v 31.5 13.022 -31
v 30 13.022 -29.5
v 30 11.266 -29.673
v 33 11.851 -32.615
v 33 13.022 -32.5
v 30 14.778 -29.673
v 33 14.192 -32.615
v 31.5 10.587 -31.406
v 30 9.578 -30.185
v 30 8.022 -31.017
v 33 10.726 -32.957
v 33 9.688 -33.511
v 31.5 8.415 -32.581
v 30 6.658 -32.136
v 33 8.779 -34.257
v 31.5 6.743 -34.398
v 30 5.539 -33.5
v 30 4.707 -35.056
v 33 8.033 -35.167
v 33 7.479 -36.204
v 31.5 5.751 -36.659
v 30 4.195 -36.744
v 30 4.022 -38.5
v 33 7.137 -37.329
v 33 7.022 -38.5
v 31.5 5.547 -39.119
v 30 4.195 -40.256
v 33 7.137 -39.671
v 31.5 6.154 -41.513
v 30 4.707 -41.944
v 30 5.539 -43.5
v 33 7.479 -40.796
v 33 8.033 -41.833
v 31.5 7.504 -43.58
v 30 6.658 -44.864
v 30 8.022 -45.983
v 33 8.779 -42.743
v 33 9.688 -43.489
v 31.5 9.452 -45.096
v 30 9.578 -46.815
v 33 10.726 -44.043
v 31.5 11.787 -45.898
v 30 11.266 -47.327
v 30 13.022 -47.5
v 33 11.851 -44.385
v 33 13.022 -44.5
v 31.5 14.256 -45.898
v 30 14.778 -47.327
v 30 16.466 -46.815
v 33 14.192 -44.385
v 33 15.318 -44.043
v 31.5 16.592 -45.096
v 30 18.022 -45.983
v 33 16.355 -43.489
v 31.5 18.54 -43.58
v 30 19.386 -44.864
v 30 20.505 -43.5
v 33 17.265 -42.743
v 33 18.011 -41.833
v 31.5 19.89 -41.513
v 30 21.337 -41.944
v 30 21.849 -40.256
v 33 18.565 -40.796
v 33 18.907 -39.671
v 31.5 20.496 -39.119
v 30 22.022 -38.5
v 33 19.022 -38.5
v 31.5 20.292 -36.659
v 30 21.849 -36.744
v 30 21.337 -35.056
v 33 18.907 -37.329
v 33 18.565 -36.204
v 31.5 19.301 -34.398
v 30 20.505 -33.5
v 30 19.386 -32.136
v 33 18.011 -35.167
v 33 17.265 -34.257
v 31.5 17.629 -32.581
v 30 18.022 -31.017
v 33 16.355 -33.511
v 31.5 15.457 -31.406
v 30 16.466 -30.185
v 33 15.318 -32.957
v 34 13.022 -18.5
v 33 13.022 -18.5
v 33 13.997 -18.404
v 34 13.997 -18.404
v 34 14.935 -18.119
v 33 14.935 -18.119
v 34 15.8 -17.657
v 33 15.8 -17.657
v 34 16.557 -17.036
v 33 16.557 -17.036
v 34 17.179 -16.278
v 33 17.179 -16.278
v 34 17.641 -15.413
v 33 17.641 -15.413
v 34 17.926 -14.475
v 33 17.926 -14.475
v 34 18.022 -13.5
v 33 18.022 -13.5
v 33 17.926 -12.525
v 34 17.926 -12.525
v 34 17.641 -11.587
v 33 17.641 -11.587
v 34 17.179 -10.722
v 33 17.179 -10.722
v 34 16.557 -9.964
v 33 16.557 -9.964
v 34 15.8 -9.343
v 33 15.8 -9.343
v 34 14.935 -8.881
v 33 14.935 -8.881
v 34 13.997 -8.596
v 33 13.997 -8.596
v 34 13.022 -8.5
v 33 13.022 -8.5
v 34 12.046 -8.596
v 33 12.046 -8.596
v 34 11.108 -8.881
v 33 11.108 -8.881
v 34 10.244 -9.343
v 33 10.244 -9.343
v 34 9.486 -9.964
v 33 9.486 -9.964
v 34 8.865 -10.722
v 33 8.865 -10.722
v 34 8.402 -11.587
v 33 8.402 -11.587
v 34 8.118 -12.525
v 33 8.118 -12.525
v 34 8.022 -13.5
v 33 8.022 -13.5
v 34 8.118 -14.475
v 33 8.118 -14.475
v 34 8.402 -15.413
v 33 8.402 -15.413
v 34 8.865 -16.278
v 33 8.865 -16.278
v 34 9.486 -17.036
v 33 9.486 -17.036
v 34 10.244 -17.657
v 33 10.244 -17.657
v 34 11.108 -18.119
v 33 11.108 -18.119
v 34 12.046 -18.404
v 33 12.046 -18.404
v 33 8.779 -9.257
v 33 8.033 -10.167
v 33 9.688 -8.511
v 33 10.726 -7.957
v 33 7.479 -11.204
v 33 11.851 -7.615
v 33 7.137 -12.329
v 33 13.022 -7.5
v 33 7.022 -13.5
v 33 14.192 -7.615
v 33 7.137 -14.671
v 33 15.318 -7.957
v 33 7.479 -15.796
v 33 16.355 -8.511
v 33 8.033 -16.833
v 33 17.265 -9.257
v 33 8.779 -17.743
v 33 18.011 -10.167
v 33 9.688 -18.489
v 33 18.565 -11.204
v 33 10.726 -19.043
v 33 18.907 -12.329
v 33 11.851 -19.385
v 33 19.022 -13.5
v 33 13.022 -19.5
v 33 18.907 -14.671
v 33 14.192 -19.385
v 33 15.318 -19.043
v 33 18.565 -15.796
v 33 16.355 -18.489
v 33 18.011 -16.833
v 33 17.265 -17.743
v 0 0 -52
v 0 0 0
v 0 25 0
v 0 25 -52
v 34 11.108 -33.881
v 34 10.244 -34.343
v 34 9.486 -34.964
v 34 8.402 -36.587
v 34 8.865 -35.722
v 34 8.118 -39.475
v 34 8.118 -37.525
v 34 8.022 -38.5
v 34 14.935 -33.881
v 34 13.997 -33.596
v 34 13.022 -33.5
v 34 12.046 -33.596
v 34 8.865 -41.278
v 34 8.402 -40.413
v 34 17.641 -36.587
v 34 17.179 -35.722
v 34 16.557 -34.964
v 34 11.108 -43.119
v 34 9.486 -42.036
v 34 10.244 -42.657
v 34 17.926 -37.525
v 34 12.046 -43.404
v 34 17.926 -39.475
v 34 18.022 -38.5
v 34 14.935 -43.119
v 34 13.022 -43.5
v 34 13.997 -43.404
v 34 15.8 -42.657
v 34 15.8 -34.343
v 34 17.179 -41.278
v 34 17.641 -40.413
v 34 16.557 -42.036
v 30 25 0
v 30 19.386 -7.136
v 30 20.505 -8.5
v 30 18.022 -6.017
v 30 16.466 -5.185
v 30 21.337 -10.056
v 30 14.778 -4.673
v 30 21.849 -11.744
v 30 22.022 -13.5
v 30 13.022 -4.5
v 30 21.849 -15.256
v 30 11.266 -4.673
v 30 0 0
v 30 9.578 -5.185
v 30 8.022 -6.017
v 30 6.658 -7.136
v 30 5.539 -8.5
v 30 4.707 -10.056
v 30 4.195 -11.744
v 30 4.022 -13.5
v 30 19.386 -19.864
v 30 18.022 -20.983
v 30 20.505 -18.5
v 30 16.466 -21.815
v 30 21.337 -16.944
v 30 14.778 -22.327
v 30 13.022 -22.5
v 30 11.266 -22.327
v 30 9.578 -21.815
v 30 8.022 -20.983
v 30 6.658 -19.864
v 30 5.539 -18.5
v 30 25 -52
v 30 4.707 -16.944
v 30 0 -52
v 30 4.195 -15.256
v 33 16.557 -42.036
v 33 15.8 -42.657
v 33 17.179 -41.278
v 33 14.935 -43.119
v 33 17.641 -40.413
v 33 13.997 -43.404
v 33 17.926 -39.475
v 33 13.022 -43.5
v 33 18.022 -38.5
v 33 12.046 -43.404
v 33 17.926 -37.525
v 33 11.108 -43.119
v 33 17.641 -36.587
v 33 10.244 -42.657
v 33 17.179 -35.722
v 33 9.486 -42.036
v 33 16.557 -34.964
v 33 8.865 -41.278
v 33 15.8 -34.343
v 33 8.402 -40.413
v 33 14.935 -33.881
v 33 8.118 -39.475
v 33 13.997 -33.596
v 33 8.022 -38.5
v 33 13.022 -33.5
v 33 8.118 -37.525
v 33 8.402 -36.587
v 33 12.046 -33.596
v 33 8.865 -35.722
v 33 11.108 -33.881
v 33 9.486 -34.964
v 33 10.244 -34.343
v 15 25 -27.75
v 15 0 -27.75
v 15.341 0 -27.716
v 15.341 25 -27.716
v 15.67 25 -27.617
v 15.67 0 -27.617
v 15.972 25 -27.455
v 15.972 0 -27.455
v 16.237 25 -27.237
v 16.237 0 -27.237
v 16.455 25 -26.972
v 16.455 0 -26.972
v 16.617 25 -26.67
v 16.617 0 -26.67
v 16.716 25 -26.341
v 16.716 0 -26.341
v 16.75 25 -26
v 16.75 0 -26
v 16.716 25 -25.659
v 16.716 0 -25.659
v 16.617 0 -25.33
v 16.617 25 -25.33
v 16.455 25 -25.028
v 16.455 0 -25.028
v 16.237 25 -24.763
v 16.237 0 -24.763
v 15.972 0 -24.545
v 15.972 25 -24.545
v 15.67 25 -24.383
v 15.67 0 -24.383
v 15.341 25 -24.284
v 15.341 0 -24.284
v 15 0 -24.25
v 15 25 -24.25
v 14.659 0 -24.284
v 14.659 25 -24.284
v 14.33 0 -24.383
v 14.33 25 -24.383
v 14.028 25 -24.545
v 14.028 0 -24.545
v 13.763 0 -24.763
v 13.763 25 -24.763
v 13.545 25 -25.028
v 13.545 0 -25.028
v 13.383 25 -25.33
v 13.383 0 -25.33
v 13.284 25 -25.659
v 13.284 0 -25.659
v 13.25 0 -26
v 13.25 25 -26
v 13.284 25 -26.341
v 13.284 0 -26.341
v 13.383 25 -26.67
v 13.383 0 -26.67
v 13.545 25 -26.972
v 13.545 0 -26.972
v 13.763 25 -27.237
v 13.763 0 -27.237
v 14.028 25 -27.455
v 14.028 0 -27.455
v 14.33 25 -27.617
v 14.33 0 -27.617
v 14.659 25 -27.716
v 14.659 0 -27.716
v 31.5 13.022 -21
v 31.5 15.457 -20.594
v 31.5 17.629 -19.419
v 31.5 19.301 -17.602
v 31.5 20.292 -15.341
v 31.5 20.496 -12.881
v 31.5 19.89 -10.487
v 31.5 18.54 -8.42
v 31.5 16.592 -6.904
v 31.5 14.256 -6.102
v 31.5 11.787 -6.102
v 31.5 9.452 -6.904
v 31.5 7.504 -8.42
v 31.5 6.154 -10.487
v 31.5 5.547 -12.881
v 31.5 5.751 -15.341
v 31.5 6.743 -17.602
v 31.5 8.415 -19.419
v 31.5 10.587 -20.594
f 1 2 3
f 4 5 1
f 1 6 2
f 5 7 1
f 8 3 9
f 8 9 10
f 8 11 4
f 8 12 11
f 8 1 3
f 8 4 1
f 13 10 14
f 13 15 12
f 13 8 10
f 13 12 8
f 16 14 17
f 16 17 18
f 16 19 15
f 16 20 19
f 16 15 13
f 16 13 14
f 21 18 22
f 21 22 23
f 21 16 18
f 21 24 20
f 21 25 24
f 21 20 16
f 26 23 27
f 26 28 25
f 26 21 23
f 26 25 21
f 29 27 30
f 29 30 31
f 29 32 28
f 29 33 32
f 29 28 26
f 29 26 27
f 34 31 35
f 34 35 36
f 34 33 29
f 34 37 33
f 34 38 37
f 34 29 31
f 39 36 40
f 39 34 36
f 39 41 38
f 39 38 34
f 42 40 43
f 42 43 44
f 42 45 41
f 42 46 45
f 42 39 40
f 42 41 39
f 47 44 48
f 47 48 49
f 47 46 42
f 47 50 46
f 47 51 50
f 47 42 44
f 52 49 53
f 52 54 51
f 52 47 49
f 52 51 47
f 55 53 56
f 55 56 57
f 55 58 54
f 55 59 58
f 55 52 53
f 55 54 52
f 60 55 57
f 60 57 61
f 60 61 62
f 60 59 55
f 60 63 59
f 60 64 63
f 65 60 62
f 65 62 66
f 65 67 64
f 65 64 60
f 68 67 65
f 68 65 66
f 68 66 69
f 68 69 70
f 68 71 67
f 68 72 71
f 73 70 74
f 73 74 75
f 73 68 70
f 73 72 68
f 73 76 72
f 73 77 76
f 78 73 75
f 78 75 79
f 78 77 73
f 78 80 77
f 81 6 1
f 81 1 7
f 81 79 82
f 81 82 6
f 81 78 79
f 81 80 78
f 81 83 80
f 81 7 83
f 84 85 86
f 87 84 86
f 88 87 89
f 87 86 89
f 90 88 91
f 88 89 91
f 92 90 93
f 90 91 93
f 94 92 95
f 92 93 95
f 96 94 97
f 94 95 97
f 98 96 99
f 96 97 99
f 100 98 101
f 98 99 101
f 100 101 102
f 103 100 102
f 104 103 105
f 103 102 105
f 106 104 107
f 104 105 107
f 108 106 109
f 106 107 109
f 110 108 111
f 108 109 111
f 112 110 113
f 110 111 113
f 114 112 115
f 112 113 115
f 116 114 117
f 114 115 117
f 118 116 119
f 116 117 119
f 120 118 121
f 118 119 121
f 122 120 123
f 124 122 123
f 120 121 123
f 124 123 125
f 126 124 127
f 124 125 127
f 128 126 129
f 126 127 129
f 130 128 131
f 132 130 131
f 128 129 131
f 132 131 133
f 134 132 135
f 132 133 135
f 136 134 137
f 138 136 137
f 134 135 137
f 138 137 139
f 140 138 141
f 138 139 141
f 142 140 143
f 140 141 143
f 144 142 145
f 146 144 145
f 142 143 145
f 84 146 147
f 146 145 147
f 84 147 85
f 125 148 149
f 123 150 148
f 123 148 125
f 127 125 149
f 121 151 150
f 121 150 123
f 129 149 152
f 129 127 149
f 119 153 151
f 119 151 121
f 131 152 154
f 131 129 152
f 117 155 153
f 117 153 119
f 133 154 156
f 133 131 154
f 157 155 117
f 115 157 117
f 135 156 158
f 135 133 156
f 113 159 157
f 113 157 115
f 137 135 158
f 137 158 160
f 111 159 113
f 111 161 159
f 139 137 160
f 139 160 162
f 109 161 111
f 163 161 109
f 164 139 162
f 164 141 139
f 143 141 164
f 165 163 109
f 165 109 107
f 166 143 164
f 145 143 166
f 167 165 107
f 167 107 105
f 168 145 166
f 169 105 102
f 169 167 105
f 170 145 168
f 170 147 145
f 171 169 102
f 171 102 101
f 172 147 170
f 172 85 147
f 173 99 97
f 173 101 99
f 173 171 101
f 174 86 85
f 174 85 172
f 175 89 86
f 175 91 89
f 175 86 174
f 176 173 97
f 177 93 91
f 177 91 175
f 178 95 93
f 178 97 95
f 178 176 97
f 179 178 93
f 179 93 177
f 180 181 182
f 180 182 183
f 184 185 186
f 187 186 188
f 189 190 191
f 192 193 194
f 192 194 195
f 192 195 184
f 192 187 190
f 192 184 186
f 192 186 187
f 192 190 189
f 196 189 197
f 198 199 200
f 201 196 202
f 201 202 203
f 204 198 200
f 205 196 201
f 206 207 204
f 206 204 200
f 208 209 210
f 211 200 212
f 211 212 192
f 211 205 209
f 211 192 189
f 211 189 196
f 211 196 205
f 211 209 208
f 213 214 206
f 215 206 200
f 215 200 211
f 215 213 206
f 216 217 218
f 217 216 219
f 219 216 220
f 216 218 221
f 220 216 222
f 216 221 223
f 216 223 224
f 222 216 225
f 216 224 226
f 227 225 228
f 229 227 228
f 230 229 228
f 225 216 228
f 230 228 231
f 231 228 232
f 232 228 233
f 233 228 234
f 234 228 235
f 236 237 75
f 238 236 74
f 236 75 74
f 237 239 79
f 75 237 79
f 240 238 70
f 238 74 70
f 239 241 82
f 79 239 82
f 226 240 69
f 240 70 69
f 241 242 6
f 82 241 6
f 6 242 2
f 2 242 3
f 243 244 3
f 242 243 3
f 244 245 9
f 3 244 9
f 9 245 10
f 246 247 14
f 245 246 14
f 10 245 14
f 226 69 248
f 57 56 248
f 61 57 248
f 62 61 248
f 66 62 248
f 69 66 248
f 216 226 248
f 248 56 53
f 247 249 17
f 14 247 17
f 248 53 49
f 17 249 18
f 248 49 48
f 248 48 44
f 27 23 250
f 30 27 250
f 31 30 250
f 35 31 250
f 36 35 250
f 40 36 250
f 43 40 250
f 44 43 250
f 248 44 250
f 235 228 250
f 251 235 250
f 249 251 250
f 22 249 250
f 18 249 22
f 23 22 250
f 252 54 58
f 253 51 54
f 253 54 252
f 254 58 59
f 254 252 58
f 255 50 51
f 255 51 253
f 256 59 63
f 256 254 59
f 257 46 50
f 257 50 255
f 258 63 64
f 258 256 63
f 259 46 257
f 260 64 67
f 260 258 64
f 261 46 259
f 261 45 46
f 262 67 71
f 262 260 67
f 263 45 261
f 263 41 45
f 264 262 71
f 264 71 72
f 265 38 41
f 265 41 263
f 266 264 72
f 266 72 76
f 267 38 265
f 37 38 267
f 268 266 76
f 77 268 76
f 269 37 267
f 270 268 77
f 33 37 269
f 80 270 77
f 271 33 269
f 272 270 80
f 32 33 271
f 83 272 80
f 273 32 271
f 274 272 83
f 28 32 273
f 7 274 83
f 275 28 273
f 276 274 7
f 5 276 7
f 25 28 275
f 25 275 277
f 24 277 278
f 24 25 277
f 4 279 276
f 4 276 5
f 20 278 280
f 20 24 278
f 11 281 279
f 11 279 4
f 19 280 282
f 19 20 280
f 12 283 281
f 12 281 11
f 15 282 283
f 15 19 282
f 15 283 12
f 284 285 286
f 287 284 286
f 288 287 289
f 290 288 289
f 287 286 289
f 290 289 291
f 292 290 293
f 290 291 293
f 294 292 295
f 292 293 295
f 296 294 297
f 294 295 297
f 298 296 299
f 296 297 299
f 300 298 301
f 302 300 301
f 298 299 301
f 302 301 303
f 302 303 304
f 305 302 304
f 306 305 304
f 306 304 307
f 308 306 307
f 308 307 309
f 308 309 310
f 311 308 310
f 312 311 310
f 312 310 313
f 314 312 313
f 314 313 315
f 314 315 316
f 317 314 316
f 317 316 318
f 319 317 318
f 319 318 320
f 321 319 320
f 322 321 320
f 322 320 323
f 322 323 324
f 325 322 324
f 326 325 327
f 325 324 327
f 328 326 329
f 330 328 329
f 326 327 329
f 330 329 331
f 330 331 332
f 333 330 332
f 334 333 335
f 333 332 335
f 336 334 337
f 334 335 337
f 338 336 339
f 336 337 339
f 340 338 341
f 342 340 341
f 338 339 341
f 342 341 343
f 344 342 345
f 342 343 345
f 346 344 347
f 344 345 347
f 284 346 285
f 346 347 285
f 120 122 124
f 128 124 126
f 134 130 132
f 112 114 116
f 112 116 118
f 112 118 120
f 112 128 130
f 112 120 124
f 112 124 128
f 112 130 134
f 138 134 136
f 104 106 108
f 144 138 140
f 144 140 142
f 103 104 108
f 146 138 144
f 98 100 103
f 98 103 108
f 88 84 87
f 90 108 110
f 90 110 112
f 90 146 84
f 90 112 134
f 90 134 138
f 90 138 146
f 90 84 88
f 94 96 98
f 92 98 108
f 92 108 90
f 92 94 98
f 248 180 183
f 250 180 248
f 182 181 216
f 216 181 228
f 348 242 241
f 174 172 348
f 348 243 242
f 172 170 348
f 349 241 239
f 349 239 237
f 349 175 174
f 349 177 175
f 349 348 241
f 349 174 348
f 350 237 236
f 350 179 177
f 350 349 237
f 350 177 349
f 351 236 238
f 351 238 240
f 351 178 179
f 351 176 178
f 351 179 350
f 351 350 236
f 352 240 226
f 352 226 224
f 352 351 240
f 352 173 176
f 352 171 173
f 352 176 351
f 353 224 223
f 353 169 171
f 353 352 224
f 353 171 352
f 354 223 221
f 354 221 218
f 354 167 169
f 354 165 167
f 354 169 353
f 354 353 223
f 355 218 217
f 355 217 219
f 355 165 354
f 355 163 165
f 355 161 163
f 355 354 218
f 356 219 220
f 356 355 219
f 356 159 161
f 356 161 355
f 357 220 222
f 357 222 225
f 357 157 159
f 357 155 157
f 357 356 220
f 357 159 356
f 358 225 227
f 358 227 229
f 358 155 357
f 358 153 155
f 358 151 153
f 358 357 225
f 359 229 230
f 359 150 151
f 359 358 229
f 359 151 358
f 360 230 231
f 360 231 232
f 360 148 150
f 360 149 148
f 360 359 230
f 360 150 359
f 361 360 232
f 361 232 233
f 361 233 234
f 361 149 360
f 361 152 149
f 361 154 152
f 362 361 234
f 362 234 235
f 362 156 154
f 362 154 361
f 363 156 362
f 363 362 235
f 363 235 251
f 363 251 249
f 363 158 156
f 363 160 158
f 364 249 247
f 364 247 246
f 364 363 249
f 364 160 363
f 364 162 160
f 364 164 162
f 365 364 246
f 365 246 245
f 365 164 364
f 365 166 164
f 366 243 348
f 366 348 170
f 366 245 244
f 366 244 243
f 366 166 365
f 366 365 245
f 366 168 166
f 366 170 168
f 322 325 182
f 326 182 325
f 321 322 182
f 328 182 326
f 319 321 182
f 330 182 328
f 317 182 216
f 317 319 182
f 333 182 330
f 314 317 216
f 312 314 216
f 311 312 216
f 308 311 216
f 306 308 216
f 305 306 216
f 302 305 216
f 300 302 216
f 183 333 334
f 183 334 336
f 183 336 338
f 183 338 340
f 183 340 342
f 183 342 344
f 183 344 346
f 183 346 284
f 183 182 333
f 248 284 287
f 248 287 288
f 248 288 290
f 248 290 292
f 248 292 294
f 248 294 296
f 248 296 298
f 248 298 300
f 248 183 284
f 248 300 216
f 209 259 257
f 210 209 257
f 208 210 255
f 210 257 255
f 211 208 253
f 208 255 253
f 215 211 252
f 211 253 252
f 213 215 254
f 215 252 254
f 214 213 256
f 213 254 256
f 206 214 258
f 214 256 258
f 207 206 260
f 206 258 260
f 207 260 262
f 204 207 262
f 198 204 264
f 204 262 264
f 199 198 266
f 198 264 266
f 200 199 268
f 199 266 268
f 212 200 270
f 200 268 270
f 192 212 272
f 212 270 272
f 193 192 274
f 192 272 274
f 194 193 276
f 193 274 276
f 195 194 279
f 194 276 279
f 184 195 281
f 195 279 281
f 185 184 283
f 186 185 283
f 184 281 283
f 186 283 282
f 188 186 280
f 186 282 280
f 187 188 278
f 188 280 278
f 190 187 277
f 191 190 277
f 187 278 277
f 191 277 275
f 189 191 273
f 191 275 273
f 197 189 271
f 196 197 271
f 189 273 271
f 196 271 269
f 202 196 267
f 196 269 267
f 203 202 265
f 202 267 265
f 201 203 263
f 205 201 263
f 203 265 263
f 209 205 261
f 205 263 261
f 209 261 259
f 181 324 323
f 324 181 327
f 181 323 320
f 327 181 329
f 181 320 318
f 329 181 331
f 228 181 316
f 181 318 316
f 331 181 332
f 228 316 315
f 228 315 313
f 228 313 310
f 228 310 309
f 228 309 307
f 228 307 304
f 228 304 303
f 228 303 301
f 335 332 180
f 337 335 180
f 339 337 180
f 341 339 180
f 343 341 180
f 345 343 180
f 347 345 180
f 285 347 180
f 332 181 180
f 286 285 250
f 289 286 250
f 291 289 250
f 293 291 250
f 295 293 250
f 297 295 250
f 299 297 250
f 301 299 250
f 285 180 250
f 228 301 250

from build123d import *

# Parameters (mm, degrees)
SKETCH1_W           = 30
SKETCH1_H           = 52
BOSS_EXTRUDE1_DEPTH = 25
SKETCH2_R           = 9
BOSS_EXTRUDE2_DEPTH = 3
CHAMFER1_SIZE       = 3
SKETCH3_R           = 5
BOSS_EXTRUDE3_DEPTH = 1
SKETCH4_R           = 1.75
CUT_EXTRUDE1_DEPTH  = 67.970142601


with BuildPart() as part:
    # Sketch1 → Boss-Extrude1 (new body)
    with BuildSketch(Plane(origin=(0, 0, 0), x_dir=(1, 0, 0), z_dir=(0, 1, 0))):
        with Locations((15, 26)):
            Rectangle(SKETCH1_W, SKETCH1_H)
    extrude(amount=BOSS_EXTRUDE1_DEPTH)

    # Sketch2 → Boss-Extrude2 (add)
    with BuildSketch(Plane(origin=(30, 0, 0), x_dir=(0, 0, -1), z_dir=(1, 0, 0))):
        with Locations((13.5, 13.021886364)):
            Circle(SKETCH2_R)
        with Locations(Location((38.5, 13.021886364, 0), (0, 0, 180))):
            Circle(SKETCH2_R)
    extrude(amount=BOSS_EXTRUDE2_DEPTH)

    # Chamfer1
    chamfer1_edges = [part.edges().sort_by_distance(p)[0] for p in [
        (33, 13.021886364, -4.5),
        (33, 13.021886364, -47.5),
    ]]
    chamfer(chamfer1_edges, length=CHAMFER1_SIZE - 0.0001)  # a hair under: the kernel refuses the full size

    # Sketch3 → Boss-Extrude3 (add)
    with BuildSketch(Plane(origin=(33, 0, 0), x_dir=(0, 0, -1), z_dir=(1, 0, 0))):
        with Locations((38.5, 13.021886364)):
            Circle(SKETCH3_R)
        with Locations((13.5, 13.021886364)):
            Circle(SKETCH3_R)
    extrude(amount=BOSS_EXTRUDE3_DEPTH)

    # Sketch4 → Cut-Extrude1 (cut, through all)
    with BuildSketch(Plane.XZ):
        with Locations(Location((15, -26, 0), (0, 0, 270))):
            Circle(SKETCH4_R)
    extrude(amount=-CUT_EXTRUDE1_DEPTH, mode=Mode.SUBTRACT)


solid = part.part
